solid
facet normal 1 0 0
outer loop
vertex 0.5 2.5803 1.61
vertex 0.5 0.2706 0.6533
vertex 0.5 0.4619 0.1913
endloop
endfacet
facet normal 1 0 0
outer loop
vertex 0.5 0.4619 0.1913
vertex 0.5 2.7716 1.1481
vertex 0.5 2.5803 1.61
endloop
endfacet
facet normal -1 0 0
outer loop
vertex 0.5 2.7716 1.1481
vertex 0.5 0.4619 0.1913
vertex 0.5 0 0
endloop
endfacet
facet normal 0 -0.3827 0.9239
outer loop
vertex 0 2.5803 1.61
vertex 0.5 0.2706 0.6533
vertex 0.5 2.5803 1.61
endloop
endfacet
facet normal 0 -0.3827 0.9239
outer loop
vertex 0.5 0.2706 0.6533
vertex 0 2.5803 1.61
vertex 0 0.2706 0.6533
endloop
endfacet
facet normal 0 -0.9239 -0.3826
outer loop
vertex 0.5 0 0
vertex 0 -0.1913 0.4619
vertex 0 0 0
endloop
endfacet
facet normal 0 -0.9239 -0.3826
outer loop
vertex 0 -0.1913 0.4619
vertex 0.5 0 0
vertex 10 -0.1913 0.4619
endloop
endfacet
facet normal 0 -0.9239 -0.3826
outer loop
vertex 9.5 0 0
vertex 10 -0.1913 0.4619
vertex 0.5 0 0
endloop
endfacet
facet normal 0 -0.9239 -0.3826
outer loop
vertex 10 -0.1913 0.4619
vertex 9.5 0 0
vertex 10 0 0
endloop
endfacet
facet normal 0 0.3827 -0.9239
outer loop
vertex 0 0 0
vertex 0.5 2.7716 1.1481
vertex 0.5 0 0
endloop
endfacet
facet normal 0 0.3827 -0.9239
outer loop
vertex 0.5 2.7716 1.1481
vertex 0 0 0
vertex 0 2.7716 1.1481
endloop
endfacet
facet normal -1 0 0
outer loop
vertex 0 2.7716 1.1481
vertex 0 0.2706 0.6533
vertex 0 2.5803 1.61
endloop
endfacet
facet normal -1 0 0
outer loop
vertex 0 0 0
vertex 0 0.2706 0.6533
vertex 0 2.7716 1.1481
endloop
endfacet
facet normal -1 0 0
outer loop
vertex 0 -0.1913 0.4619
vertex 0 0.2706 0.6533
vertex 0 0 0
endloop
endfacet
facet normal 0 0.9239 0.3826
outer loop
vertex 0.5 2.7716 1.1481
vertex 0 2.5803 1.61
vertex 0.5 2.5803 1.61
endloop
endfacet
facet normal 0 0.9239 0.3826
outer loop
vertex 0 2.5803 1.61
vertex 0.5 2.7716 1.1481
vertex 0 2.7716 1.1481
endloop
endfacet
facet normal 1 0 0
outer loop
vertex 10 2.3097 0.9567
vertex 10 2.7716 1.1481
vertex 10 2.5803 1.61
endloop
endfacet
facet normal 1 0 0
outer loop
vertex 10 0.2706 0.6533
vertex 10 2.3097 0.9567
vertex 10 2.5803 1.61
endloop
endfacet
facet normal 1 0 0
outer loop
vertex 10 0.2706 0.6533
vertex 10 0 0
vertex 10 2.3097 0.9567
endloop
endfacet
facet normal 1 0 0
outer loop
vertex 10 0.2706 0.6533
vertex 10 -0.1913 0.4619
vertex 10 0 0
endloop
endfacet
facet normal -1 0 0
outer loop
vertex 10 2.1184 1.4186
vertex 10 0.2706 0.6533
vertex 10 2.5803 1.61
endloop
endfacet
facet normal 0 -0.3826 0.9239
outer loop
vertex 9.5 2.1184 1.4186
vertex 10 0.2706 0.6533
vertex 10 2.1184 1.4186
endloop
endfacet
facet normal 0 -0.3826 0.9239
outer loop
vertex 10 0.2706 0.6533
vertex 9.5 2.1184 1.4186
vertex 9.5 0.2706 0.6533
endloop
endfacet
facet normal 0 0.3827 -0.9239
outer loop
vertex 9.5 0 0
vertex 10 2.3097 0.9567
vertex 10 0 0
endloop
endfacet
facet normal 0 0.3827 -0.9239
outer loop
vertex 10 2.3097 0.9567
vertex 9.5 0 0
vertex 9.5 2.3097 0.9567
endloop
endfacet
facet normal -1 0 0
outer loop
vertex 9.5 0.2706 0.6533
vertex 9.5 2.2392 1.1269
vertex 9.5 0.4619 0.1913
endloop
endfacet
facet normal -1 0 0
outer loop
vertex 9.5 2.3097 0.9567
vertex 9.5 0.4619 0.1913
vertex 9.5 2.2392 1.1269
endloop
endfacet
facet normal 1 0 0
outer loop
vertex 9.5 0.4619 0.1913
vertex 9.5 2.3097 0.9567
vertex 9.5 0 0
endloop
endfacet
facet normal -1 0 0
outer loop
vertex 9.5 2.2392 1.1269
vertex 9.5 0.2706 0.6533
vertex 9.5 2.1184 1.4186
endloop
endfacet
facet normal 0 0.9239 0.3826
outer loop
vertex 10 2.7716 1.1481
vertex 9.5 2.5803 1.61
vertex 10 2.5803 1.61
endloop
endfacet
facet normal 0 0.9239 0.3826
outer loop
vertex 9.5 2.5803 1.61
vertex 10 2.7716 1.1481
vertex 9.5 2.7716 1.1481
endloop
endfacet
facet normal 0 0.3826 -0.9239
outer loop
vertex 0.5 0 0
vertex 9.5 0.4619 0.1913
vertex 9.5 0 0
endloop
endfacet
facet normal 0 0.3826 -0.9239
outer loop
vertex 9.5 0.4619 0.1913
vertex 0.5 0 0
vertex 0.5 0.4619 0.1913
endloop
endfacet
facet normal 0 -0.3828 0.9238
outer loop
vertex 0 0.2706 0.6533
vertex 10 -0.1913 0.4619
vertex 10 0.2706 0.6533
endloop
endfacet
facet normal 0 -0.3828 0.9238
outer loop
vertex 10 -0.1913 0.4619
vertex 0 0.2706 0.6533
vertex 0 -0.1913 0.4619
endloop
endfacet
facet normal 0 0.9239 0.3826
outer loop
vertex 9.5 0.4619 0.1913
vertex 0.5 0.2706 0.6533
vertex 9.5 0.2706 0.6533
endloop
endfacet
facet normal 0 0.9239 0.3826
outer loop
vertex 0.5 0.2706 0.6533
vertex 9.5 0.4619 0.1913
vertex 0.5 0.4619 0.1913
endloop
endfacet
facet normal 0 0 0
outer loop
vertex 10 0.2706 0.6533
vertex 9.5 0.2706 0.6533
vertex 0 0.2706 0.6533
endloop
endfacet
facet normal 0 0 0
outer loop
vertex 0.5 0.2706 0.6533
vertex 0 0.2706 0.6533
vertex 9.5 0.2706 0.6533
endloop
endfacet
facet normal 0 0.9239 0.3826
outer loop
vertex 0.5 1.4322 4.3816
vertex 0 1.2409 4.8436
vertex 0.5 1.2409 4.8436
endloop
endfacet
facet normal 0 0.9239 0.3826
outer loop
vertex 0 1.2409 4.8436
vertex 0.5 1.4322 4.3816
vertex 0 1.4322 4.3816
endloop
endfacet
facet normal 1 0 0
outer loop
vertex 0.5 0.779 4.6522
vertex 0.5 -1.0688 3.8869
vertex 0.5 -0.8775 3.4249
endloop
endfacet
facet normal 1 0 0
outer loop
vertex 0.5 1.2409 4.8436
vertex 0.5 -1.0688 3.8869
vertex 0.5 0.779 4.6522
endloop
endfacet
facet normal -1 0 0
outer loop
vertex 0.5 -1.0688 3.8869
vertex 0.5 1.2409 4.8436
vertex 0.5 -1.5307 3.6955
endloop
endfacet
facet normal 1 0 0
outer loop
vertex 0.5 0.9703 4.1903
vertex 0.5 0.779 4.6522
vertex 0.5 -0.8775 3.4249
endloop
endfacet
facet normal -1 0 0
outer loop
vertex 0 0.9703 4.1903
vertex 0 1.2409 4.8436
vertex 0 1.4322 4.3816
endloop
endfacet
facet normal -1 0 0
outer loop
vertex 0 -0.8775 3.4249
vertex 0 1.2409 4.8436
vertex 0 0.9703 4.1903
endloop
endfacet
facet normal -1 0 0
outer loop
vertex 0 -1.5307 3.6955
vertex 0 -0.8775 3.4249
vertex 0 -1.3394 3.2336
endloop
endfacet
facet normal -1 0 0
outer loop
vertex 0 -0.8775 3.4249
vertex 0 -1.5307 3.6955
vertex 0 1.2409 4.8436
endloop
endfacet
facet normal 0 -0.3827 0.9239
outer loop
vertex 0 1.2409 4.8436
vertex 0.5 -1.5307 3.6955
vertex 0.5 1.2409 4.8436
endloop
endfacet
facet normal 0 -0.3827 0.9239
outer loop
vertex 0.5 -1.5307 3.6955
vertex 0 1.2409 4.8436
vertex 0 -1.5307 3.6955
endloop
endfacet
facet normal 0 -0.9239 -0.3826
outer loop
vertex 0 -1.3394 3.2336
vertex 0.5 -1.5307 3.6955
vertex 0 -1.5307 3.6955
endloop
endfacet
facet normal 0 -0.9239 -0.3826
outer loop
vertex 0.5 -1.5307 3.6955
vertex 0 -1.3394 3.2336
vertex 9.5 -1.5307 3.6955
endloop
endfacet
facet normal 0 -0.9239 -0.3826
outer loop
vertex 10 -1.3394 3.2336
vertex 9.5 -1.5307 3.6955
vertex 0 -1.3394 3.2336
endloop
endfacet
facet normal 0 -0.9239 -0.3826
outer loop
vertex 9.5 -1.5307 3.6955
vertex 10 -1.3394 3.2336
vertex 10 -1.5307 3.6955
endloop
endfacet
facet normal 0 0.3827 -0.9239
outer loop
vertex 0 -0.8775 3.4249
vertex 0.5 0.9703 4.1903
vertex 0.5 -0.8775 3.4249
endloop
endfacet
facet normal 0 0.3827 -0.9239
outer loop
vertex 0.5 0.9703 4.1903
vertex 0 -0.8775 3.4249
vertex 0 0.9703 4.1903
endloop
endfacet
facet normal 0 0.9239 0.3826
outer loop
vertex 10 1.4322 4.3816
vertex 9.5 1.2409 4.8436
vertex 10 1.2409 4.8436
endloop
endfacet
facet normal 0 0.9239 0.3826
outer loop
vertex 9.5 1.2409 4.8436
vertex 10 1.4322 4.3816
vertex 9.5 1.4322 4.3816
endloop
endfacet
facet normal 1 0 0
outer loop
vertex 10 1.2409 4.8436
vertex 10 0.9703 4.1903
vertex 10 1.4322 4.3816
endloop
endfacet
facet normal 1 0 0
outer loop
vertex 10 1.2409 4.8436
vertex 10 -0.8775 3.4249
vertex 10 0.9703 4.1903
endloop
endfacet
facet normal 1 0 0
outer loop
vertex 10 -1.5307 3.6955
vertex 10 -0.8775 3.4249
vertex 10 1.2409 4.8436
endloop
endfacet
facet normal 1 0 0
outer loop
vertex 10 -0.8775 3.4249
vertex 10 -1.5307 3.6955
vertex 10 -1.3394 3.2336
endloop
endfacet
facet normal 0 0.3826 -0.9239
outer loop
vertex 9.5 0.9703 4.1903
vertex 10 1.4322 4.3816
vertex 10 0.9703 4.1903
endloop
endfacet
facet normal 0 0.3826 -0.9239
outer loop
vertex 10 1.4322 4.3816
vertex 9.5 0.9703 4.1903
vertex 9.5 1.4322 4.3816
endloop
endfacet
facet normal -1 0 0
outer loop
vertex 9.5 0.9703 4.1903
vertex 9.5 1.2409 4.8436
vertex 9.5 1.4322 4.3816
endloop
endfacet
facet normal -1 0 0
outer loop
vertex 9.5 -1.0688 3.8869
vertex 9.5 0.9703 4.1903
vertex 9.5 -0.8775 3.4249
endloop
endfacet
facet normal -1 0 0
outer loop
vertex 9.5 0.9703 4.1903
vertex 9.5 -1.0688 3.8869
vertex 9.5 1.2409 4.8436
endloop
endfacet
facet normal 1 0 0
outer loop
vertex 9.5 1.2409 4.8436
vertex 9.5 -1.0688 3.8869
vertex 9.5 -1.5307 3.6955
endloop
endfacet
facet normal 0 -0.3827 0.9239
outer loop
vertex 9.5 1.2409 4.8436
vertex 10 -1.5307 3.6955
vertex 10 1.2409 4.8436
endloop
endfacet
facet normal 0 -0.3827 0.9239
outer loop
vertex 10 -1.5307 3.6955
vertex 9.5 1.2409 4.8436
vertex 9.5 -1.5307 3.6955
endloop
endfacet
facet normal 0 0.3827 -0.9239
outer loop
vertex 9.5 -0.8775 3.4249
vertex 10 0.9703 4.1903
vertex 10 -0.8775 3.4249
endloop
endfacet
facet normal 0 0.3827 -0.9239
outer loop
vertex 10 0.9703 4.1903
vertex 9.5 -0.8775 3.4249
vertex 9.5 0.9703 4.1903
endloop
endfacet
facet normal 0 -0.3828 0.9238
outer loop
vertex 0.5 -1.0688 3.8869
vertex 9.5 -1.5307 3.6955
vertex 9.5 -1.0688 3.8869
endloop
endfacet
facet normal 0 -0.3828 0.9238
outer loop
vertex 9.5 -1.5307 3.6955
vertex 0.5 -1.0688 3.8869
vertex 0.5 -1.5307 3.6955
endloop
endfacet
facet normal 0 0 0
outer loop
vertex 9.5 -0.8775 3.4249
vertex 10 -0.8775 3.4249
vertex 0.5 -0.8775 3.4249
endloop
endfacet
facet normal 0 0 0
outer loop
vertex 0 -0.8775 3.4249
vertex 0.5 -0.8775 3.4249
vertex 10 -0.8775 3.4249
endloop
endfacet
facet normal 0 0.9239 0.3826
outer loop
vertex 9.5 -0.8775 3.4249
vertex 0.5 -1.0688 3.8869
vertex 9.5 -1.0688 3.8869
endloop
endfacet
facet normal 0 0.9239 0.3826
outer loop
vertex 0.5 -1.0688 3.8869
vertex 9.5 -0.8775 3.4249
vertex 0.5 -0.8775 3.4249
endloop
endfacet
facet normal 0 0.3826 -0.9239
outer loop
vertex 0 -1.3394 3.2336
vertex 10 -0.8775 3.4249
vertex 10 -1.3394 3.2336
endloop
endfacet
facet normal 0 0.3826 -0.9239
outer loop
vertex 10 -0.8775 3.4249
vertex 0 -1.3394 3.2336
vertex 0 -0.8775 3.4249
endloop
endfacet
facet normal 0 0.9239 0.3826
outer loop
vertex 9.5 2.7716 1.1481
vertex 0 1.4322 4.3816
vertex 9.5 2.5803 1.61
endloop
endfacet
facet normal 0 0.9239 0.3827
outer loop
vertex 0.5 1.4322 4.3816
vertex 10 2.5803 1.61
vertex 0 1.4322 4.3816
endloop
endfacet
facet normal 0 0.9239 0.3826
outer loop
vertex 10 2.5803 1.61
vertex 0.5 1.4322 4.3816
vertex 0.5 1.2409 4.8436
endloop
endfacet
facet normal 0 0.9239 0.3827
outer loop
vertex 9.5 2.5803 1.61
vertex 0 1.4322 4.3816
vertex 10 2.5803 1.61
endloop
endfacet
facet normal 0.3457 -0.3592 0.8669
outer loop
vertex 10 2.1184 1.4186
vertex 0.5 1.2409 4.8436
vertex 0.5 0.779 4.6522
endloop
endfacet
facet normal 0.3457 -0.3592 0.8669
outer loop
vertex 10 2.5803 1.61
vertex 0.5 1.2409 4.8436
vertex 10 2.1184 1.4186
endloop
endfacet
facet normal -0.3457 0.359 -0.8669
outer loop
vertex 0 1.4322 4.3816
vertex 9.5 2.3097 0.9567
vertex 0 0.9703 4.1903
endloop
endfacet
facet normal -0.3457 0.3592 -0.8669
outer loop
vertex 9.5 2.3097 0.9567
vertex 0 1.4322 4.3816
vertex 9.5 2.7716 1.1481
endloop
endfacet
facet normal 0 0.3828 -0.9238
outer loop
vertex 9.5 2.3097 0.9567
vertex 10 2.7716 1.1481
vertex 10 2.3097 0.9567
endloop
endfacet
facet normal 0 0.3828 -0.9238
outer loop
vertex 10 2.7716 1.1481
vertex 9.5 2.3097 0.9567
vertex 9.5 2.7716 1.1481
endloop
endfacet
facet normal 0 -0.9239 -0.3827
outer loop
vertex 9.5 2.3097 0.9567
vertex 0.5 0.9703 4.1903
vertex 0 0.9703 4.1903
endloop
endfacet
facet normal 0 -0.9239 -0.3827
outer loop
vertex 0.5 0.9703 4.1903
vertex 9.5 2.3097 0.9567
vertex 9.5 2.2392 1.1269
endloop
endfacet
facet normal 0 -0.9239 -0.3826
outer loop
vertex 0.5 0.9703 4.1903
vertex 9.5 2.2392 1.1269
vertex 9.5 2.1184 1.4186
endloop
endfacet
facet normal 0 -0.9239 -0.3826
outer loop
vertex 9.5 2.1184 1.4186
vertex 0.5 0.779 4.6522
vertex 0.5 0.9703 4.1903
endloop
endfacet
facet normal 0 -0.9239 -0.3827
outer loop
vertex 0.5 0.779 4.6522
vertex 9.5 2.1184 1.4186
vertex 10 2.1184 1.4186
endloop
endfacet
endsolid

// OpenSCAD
$fn=7;
union()
{
	hull()
	{
		translate([0,0,0])
		{
			rotate(22.500002,[1,0,0])
			{
				cube([0.5,0.5,0.5]);
			}
		}
		translate([0,2.3096988,0.95670867])
		{
			rotate(22.500002,[1,0,0])
			{
				cube([0.5,0.5,0.5]);
			}
		}
	}
	hull()
	{
		translate([9.5,0,0])
		{
			rotate(22.500002,[1,0,0])
			{
				cube([0.5,0.5,0.5]);
			}
		}
		translate([9.5,2.3096988,0.95670867])
		{
			rotate(22.500002,[1,0,0])
			{
				cube([0.5,0.5,0.5]);
			}
		}
	}
	hull()
	{
		translate([9.5,0,0])
		{
			rotate(22.500002,[1,0,0])
			{
				cube([0.5,0.5,0.5]);
			}
		}
		translate([0,0,0])
		{
			rotate(22.500002,[1,0,0])
			{
				cube([0.5,0.5,0.5]);
			}
		}
	}
	hull()
	{
		translate([0,-1.3393921,3.2335782])
		{
			rotate(22.500002,[1,0,0])
			{
				cube([0.5,0.5,0.5]);
			}
		}
		translate([0,0.97030675,4.1902866])
		{
			rotate(22.500002,[1,0,0])
			{
				cube([0.5,0.5,0.5]);
			}
		}
	}
	hull()
	{
		translate([9.5,-1.3393921,3.2335782])
		{
			rotate(22.500002,[1,0,0])
			{
				cube([0.5,0.5,0.5]);
			}
		}
		translate([9.5,0.97030675,4.1902866])
		{
			rotate(22.500002,[1,0,0])
			{
				cube([0.5,0.5,0.5]);
			}
		}
	}
	hull()
	{
		translate([9.5,-1.3393921,3.2335782])
		{
			rotate(22.500002,[1,0,0])
			{
				cube([0.5,0.5,0.5]);
			}
		}
		translate([0,-1.3393921,3.2335782])
		{
			rotate(22.500002,[1,0,0])
			{
				cube([0.5,0.5,0.5]);
			}
		}
	}
	hull()
	{
		translate([0,0.97030675,4.1902866])
		{
			rotate(22.500002,[1,0,0])
			{
				cube([0.5,0.5,0.5]);
			}
		}
		translate([9.5,2.3096988,0.95670867])
		{
			rotate(22.500002,[1,0,0])
			{
				cube([0.5,0.5,0.5]);
			}
		}
	}
}
